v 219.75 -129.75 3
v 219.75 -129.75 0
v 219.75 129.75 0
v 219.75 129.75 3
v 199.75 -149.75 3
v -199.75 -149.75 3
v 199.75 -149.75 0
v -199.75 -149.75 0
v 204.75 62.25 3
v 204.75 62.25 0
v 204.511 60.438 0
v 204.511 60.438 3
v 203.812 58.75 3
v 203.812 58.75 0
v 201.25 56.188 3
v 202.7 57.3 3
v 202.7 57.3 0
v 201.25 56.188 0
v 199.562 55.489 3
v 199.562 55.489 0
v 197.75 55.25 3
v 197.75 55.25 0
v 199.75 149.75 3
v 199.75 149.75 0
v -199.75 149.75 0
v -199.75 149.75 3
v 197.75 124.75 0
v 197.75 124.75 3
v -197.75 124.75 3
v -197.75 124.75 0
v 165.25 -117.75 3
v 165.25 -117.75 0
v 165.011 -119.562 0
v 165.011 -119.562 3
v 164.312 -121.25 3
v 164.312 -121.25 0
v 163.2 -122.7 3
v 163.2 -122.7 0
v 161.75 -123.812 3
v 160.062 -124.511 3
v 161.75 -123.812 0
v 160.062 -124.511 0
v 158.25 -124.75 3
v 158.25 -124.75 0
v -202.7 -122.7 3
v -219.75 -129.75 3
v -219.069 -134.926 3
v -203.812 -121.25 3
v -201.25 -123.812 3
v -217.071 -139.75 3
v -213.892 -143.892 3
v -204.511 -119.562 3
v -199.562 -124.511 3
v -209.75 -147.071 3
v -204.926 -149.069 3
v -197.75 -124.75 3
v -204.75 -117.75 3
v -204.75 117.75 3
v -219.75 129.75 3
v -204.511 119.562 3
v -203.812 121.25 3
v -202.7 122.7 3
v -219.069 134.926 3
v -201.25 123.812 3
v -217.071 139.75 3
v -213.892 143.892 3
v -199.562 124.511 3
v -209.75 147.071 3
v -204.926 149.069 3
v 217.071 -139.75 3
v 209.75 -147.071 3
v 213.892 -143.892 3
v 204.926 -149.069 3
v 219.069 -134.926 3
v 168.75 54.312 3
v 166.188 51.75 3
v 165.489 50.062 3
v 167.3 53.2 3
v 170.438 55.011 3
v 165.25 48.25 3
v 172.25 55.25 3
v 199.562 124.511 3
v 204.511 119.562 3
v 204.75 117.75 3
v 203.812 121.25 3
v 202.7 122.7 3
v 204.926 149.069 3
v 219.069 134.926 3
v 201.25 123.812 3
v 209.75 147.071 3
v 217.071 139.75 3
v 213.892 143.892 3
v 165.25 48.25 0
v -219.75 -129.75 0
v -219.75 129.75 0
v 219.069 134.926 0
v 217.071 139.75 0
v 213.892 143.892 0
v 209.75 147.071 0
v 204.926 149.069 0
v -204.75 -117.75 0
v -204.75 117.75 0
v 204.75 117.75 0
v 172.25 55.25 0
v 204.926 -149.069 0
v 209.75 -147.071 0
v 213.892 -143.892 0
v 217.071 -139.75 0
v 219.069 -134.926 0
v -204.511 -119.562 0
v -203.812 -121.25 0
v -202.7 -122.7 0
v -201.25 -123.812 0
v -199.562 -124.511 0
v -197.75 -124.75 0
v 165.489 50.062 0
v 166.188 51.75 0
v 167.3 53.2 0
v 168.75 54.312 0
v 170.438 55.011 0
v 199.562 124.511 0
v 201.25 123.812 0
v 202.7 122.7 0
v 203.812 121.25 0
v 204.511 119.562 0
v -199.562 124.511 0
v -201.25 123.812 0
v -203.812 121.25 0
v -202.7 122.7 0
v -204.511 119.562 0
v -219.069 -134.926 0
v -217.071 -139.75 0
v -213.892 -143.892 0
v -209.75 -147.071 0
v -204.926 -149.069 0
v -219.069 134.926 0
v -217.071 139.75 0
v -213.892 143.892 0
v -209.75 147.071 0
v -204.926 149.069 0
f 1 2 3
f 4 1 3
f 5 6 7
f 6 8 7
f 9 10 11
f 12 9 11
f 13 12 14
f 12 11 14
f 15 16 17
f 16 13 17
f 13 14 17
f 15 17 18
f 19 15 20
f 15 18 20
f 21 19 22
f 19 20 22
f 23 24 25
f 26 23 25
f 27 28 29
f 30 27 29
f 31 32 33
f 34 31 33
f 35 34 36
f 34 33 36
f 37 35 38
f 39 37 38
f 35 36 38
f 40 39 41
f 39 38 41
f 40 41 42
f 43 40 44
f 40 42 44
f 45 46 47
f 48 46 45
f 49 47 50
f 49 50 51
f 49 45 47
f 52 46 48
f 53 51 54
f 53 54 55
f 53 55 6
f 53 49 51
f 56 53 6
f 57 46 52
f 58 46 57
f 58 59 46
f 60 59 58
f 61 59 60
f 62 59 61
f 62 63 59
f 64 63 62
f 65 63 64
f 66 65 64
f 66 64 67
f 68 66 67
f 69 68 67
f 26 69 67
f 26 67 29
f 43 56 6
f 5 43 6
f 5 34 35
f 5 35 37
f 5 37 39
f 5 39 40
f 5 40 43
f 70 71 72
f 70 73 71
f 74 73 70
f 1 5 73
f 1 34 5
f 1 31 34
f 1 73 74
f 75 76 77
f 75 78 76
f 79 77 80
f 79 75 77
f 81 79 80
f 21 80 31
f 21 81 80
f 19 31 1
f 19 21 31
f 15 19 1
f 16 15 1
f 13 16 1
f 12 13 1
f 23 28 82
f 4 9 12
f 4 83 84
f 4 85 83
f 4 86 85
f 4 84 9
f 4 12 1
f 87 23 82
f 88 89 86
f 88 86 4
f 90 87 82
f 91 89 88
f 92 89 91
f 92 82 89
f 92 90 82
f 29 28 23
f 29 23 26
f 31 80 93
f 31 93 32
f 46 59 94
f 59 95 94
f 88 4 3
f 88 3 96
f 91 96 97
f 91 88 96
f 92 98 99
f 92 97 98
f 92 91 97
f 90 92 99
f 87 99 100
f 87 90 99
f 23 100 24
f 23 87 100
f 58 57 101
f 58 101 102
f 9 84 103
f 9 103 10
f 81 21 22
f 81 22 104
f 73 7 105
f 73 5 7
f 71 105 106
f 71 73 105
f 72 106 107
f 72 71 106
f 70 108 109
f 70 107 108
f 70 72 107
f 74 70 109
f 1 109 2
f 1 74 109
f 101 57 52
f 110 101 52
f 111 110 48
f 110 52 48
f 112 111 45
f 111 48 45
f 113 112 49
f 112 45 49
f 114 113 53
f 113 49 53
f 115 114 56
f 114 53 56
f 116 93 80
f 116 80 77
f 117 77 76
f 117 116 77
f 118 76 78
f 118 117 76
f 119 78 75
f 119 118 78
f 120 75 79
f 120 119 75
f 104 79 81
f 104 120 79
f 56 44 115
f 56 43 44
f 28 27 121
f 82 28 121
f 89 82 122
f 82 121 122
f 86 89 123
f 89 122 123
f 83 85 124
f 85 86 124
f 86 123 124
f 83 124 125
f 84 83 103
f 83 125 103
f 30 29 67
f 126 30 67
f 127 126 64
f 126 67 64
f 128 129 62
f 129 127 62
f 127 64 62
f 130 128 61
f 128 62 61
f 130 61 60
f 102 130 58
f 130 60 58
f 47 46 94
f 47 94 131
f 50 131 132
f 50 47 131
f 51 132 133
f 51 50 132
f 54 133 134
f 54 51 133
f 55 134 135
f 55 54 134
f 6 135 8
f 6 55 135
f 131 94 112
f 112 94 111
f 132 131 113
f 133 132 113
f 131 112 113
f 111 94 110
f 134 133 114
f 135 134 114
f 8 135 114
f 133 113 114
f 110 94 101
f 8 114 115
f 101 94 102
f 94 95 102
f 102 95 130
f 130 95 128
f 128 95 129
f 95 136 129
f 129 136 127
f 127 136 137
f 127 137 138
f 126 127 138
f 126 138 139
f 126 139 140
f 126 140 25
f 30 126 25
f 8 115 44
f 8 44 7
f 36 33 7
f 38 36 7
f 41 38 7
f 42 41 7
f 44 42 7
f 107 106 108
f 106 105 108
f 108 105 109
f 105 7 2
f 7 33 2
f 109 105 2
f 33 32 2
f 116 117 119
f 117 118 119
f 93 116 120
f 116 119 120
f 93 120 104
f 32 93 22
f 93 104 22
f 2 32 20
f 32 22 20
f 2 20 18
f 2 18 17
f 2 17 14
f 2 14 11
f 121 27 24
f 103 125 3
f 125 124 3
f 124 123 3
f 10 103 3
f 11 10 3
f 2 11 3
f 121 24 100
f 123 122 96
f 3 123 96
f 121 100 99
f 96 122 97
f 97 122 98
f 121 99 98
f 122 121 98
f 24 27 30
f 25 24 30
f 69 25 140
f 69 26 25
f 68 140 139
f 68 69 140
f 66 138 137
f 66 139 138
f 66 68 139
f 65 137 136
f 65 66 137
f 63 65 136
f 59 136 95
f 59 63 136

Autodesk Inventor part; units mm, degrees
ref_plane "YZ Plane" through (0, 0, 0) normal (1, 0, 0) x (0, 1, 0)
ref_plane "XZ Plane" through (0, 0, 0) normal (0, 1, 0) x (-1, 0, 0)
ref_plane "XY Plane" through (0, 0, 0) normal (0, 0, 1) x (1, 0, 0)
sketch "Sketch1" plane through (0, 0, 0) normal (0, 0, 1) x (1, 0, 0)
  line L0 (-219.75, -149.75) -> (219.75, -149.75)
  line L1 (219.75, -149.75) -> (219.75, 149.75)
  line L2 (219.75, 149.75) -> (-219.75, 149.75)
  line L3 (-219.75, 149.75) -> (-219.75, -149.75)
  line L4 (-219.75, -149.75) -> (219.75, 149.75) construction
  line L5 (219.75, -149.75) -> (-219.75, 149.75) construction
  point P0 (0, 0)
  dimension "d0" = 439.5
  dimension "d1" = 299.5
extrude "Extrusion1" add sketch "Sketch1" along normal blind 3
fillet "Fillet1" radius 20 4 edges at (219.75, 149.75, 1.5) (219.75, -149.75, 1.5) (-219.75, -149.75, 1.5) (-219.75, 149.75, 1.5)
sketch "Sketch2" plane through (0, 0, 3) normal (0, 0, 1) x (1, 0, 0)
  line L0 (-313.799, 0) -> (313.799, 0) construction
  line L1 (-199.75, -149.75) -> (199.75, -149.75) projected
  arc A0 (-219.75, -129.75) -> (-199.75, -149.75) centre (-199.75, -129.75) ccw projected
  line L2 (-219.75, 129.75) -> (-219.75, -129.75) projected
  arc A1 (-199.75, 149.75) -> (-219.75, 129.75) centre (-199.75, 129.75) ccw projected
  line L3 (199.75, 149.75) -> (-199.75, 149.75) projected
  arc A2 (219.75, 129.75) -> (199.75, 149.75) centre (199.75, 129.75) ccw projected
  line L4 (219.75, -129.75) -> (219.75, 129.75) projected
  arc A3 (199.75, -149.75) -> (219.75, -129.75) centre (199.75, -129.75) ccw projected
  line L5 (199.75, -134.75) -> (-199.75, -134.75)
  arc A4 (-204.75, -129.75) -> (-199.75, -134.75) centre (-199.75, -129.75) ccw
  line L6 (-204.75, -129.75) -> (-204.75, 129.75)
  arc A5 (-199.75, 134.75) -> (-204.75, 129.75) centre (-199.75, 129.75) ccw
  line L7 (-199.75, 134.75) -> (199.75, 134.75)
  arc A6 (204.75, 129.75) -> (199.75, 134.75) centre (199.75, 129.75) ccw
  line L8 (204.75, 129.75) -> (204.75, -129.75)
  arc A7 (199.75, -134.75) -> (204.75, -129.75) centre (199.75, -129.75) ccw
  line L9 (204.75, 55.25) -> (165.25, 55.25)
  line L10 (165.25, 55.25) -> (165.25, -134.75)
  line L11 (165.25, -134.75) -> (204.75, -134.75)
  line L12 (204.75, -134.75) -> (204.75, 55.25)
  dimension "d7" = 15
  dimension "d8" = 370
  dimension "d9" = 190
extrude "Extrusion2" cut sketch "Sketch2" against normal through all contours L5 A4 L6 A5 L7 A6 L8 L9 L10
fillet "Fillet2" radius 7 3 edges at (204.75, 55.25, 1.5) (165.25, 55.25, 1.5) (165.25, -134.75, 1.5)
sketch "Sketch4" plane through (0, 0, 3) normal (0, 0, 1) x (1, 0, 0)
  line L0 (165.25, 48.25) -> (165.25, -127.75) projected
  line L1 (165.25, -124.75) -> (-206.75, -124.75)
  line L2 (-206.75, -124.75) -> (-206.75, -134.75)
  line L3 (-206.75, -134.75) -> (165.25, -134.75)
  line L4 (165.25, -134.75) -> (165.25, -124.75)
  line L5 (-206.75, 134.75) -> (204.75, 134.75)
  line L6 (204.75, 134.75) -> (204.75, 124.75)
  line L7 (204.75, 124.75) -> (-206.75, 124.75)
  line L8 (-206.75, 124.75) -> (-206.75, 134.75)
  line L9 (-199.75, 134.75) -> (199.75, 134.75) projected
  line L10 (158.25, -134.75) -> (-199.75, -134.75) projected
  point P0 (0, 0)
  point P1 (-1, 134.75)
  point P2 (204.75, 129.75)
  point P3 (-20.75, -134.75)
  point P4 (165.25, -127.75)
  dimension "d13" = 10
  dimension "d14" = 10
extrude "Extrusion3" add sketch "Sketch4" against normal up to surface (3 mm away)
fillet "Fillet3" radius 7 4 edges at (204.75, 124.75, 1.5) (-204.75, 124.75, 1.5) (-204.75, -124.75, 1.5) (165.25, -124.75, 1.5)
sketch "Sketch5" plane through (0, 0, 3) normal (0, 0, 1) x (1, 0, 0)
  line L0 (204.75, 117.75) -> (204.75, 62.25) projected
  arc A0 (197.75, 55.25) -> (204.75, 62.25) centre (197.75, 62.25) ccw projected
  line L1 (197.75, 55.25) -> (172.25, 55.25) projected
  arc A1 (172.25, 55.25) -> (165.25, 48.25) centre (172.25, 48.25) ccw projected
  line L2 (165.25, 48.25) -> (165.25, -117.75) projected
  arc A2 (158.25, -124.75) -> (165.25, -117.75) centre (158.25, -117.75) ccw projected
  line L3 (158.25, -124.75) -> (-197.75, -124.75) projected
  arc A3 (-204.75, -117.75) -> (-197.75, -124.75) centre (-197.75, -117.75) ccw projected
  line L4 (-204.75, -117.75) -> (-204.75, 117.75) projected
  arc A4 (-197.75, 124.75) -> (-204.75, 117.75) centre (-197.75, 117.75) ccw projected
  line L5 (-197.75, 124.75) -> (197.75, 124.75) projected
  arc A5 (204.75, 117.75) -> (197.75, 124.75) centre (197.75, 117.75) ccw projected
  arc A6 (-199.75, 149.75) -> (-219.75, 129.75) centre (-199.75, 129.75) ccw projected
  line L6 (-219.75, 129.75) -> (-219.75, -129.75) projected
  arc A7 (-219.75, -129.75) -> (-199.75, -149.75) centre (-199.75, -129.75) ccw projected
  line L7 (-199.75, -149.75) -> (199.75, -149.75) projected
  arc A8 (199.75, -149.75) -> (219.75, -129.75) centre (199.75, -129.75) ccw projected
  line L8 (219.75, -129.75) -> (219.75, 129.75) projected
  arc A9 (219.75, 129.75) -> (199.75, 149.75) centre (199.75, 129.75) ccw projected
  line L9 (199.75, 149.75) -> (-199.75, 149.75) projected
  point P0 (0, 0)
equation "\"d14\" = d13"
properties part number "UpperAcrylicPlate"
